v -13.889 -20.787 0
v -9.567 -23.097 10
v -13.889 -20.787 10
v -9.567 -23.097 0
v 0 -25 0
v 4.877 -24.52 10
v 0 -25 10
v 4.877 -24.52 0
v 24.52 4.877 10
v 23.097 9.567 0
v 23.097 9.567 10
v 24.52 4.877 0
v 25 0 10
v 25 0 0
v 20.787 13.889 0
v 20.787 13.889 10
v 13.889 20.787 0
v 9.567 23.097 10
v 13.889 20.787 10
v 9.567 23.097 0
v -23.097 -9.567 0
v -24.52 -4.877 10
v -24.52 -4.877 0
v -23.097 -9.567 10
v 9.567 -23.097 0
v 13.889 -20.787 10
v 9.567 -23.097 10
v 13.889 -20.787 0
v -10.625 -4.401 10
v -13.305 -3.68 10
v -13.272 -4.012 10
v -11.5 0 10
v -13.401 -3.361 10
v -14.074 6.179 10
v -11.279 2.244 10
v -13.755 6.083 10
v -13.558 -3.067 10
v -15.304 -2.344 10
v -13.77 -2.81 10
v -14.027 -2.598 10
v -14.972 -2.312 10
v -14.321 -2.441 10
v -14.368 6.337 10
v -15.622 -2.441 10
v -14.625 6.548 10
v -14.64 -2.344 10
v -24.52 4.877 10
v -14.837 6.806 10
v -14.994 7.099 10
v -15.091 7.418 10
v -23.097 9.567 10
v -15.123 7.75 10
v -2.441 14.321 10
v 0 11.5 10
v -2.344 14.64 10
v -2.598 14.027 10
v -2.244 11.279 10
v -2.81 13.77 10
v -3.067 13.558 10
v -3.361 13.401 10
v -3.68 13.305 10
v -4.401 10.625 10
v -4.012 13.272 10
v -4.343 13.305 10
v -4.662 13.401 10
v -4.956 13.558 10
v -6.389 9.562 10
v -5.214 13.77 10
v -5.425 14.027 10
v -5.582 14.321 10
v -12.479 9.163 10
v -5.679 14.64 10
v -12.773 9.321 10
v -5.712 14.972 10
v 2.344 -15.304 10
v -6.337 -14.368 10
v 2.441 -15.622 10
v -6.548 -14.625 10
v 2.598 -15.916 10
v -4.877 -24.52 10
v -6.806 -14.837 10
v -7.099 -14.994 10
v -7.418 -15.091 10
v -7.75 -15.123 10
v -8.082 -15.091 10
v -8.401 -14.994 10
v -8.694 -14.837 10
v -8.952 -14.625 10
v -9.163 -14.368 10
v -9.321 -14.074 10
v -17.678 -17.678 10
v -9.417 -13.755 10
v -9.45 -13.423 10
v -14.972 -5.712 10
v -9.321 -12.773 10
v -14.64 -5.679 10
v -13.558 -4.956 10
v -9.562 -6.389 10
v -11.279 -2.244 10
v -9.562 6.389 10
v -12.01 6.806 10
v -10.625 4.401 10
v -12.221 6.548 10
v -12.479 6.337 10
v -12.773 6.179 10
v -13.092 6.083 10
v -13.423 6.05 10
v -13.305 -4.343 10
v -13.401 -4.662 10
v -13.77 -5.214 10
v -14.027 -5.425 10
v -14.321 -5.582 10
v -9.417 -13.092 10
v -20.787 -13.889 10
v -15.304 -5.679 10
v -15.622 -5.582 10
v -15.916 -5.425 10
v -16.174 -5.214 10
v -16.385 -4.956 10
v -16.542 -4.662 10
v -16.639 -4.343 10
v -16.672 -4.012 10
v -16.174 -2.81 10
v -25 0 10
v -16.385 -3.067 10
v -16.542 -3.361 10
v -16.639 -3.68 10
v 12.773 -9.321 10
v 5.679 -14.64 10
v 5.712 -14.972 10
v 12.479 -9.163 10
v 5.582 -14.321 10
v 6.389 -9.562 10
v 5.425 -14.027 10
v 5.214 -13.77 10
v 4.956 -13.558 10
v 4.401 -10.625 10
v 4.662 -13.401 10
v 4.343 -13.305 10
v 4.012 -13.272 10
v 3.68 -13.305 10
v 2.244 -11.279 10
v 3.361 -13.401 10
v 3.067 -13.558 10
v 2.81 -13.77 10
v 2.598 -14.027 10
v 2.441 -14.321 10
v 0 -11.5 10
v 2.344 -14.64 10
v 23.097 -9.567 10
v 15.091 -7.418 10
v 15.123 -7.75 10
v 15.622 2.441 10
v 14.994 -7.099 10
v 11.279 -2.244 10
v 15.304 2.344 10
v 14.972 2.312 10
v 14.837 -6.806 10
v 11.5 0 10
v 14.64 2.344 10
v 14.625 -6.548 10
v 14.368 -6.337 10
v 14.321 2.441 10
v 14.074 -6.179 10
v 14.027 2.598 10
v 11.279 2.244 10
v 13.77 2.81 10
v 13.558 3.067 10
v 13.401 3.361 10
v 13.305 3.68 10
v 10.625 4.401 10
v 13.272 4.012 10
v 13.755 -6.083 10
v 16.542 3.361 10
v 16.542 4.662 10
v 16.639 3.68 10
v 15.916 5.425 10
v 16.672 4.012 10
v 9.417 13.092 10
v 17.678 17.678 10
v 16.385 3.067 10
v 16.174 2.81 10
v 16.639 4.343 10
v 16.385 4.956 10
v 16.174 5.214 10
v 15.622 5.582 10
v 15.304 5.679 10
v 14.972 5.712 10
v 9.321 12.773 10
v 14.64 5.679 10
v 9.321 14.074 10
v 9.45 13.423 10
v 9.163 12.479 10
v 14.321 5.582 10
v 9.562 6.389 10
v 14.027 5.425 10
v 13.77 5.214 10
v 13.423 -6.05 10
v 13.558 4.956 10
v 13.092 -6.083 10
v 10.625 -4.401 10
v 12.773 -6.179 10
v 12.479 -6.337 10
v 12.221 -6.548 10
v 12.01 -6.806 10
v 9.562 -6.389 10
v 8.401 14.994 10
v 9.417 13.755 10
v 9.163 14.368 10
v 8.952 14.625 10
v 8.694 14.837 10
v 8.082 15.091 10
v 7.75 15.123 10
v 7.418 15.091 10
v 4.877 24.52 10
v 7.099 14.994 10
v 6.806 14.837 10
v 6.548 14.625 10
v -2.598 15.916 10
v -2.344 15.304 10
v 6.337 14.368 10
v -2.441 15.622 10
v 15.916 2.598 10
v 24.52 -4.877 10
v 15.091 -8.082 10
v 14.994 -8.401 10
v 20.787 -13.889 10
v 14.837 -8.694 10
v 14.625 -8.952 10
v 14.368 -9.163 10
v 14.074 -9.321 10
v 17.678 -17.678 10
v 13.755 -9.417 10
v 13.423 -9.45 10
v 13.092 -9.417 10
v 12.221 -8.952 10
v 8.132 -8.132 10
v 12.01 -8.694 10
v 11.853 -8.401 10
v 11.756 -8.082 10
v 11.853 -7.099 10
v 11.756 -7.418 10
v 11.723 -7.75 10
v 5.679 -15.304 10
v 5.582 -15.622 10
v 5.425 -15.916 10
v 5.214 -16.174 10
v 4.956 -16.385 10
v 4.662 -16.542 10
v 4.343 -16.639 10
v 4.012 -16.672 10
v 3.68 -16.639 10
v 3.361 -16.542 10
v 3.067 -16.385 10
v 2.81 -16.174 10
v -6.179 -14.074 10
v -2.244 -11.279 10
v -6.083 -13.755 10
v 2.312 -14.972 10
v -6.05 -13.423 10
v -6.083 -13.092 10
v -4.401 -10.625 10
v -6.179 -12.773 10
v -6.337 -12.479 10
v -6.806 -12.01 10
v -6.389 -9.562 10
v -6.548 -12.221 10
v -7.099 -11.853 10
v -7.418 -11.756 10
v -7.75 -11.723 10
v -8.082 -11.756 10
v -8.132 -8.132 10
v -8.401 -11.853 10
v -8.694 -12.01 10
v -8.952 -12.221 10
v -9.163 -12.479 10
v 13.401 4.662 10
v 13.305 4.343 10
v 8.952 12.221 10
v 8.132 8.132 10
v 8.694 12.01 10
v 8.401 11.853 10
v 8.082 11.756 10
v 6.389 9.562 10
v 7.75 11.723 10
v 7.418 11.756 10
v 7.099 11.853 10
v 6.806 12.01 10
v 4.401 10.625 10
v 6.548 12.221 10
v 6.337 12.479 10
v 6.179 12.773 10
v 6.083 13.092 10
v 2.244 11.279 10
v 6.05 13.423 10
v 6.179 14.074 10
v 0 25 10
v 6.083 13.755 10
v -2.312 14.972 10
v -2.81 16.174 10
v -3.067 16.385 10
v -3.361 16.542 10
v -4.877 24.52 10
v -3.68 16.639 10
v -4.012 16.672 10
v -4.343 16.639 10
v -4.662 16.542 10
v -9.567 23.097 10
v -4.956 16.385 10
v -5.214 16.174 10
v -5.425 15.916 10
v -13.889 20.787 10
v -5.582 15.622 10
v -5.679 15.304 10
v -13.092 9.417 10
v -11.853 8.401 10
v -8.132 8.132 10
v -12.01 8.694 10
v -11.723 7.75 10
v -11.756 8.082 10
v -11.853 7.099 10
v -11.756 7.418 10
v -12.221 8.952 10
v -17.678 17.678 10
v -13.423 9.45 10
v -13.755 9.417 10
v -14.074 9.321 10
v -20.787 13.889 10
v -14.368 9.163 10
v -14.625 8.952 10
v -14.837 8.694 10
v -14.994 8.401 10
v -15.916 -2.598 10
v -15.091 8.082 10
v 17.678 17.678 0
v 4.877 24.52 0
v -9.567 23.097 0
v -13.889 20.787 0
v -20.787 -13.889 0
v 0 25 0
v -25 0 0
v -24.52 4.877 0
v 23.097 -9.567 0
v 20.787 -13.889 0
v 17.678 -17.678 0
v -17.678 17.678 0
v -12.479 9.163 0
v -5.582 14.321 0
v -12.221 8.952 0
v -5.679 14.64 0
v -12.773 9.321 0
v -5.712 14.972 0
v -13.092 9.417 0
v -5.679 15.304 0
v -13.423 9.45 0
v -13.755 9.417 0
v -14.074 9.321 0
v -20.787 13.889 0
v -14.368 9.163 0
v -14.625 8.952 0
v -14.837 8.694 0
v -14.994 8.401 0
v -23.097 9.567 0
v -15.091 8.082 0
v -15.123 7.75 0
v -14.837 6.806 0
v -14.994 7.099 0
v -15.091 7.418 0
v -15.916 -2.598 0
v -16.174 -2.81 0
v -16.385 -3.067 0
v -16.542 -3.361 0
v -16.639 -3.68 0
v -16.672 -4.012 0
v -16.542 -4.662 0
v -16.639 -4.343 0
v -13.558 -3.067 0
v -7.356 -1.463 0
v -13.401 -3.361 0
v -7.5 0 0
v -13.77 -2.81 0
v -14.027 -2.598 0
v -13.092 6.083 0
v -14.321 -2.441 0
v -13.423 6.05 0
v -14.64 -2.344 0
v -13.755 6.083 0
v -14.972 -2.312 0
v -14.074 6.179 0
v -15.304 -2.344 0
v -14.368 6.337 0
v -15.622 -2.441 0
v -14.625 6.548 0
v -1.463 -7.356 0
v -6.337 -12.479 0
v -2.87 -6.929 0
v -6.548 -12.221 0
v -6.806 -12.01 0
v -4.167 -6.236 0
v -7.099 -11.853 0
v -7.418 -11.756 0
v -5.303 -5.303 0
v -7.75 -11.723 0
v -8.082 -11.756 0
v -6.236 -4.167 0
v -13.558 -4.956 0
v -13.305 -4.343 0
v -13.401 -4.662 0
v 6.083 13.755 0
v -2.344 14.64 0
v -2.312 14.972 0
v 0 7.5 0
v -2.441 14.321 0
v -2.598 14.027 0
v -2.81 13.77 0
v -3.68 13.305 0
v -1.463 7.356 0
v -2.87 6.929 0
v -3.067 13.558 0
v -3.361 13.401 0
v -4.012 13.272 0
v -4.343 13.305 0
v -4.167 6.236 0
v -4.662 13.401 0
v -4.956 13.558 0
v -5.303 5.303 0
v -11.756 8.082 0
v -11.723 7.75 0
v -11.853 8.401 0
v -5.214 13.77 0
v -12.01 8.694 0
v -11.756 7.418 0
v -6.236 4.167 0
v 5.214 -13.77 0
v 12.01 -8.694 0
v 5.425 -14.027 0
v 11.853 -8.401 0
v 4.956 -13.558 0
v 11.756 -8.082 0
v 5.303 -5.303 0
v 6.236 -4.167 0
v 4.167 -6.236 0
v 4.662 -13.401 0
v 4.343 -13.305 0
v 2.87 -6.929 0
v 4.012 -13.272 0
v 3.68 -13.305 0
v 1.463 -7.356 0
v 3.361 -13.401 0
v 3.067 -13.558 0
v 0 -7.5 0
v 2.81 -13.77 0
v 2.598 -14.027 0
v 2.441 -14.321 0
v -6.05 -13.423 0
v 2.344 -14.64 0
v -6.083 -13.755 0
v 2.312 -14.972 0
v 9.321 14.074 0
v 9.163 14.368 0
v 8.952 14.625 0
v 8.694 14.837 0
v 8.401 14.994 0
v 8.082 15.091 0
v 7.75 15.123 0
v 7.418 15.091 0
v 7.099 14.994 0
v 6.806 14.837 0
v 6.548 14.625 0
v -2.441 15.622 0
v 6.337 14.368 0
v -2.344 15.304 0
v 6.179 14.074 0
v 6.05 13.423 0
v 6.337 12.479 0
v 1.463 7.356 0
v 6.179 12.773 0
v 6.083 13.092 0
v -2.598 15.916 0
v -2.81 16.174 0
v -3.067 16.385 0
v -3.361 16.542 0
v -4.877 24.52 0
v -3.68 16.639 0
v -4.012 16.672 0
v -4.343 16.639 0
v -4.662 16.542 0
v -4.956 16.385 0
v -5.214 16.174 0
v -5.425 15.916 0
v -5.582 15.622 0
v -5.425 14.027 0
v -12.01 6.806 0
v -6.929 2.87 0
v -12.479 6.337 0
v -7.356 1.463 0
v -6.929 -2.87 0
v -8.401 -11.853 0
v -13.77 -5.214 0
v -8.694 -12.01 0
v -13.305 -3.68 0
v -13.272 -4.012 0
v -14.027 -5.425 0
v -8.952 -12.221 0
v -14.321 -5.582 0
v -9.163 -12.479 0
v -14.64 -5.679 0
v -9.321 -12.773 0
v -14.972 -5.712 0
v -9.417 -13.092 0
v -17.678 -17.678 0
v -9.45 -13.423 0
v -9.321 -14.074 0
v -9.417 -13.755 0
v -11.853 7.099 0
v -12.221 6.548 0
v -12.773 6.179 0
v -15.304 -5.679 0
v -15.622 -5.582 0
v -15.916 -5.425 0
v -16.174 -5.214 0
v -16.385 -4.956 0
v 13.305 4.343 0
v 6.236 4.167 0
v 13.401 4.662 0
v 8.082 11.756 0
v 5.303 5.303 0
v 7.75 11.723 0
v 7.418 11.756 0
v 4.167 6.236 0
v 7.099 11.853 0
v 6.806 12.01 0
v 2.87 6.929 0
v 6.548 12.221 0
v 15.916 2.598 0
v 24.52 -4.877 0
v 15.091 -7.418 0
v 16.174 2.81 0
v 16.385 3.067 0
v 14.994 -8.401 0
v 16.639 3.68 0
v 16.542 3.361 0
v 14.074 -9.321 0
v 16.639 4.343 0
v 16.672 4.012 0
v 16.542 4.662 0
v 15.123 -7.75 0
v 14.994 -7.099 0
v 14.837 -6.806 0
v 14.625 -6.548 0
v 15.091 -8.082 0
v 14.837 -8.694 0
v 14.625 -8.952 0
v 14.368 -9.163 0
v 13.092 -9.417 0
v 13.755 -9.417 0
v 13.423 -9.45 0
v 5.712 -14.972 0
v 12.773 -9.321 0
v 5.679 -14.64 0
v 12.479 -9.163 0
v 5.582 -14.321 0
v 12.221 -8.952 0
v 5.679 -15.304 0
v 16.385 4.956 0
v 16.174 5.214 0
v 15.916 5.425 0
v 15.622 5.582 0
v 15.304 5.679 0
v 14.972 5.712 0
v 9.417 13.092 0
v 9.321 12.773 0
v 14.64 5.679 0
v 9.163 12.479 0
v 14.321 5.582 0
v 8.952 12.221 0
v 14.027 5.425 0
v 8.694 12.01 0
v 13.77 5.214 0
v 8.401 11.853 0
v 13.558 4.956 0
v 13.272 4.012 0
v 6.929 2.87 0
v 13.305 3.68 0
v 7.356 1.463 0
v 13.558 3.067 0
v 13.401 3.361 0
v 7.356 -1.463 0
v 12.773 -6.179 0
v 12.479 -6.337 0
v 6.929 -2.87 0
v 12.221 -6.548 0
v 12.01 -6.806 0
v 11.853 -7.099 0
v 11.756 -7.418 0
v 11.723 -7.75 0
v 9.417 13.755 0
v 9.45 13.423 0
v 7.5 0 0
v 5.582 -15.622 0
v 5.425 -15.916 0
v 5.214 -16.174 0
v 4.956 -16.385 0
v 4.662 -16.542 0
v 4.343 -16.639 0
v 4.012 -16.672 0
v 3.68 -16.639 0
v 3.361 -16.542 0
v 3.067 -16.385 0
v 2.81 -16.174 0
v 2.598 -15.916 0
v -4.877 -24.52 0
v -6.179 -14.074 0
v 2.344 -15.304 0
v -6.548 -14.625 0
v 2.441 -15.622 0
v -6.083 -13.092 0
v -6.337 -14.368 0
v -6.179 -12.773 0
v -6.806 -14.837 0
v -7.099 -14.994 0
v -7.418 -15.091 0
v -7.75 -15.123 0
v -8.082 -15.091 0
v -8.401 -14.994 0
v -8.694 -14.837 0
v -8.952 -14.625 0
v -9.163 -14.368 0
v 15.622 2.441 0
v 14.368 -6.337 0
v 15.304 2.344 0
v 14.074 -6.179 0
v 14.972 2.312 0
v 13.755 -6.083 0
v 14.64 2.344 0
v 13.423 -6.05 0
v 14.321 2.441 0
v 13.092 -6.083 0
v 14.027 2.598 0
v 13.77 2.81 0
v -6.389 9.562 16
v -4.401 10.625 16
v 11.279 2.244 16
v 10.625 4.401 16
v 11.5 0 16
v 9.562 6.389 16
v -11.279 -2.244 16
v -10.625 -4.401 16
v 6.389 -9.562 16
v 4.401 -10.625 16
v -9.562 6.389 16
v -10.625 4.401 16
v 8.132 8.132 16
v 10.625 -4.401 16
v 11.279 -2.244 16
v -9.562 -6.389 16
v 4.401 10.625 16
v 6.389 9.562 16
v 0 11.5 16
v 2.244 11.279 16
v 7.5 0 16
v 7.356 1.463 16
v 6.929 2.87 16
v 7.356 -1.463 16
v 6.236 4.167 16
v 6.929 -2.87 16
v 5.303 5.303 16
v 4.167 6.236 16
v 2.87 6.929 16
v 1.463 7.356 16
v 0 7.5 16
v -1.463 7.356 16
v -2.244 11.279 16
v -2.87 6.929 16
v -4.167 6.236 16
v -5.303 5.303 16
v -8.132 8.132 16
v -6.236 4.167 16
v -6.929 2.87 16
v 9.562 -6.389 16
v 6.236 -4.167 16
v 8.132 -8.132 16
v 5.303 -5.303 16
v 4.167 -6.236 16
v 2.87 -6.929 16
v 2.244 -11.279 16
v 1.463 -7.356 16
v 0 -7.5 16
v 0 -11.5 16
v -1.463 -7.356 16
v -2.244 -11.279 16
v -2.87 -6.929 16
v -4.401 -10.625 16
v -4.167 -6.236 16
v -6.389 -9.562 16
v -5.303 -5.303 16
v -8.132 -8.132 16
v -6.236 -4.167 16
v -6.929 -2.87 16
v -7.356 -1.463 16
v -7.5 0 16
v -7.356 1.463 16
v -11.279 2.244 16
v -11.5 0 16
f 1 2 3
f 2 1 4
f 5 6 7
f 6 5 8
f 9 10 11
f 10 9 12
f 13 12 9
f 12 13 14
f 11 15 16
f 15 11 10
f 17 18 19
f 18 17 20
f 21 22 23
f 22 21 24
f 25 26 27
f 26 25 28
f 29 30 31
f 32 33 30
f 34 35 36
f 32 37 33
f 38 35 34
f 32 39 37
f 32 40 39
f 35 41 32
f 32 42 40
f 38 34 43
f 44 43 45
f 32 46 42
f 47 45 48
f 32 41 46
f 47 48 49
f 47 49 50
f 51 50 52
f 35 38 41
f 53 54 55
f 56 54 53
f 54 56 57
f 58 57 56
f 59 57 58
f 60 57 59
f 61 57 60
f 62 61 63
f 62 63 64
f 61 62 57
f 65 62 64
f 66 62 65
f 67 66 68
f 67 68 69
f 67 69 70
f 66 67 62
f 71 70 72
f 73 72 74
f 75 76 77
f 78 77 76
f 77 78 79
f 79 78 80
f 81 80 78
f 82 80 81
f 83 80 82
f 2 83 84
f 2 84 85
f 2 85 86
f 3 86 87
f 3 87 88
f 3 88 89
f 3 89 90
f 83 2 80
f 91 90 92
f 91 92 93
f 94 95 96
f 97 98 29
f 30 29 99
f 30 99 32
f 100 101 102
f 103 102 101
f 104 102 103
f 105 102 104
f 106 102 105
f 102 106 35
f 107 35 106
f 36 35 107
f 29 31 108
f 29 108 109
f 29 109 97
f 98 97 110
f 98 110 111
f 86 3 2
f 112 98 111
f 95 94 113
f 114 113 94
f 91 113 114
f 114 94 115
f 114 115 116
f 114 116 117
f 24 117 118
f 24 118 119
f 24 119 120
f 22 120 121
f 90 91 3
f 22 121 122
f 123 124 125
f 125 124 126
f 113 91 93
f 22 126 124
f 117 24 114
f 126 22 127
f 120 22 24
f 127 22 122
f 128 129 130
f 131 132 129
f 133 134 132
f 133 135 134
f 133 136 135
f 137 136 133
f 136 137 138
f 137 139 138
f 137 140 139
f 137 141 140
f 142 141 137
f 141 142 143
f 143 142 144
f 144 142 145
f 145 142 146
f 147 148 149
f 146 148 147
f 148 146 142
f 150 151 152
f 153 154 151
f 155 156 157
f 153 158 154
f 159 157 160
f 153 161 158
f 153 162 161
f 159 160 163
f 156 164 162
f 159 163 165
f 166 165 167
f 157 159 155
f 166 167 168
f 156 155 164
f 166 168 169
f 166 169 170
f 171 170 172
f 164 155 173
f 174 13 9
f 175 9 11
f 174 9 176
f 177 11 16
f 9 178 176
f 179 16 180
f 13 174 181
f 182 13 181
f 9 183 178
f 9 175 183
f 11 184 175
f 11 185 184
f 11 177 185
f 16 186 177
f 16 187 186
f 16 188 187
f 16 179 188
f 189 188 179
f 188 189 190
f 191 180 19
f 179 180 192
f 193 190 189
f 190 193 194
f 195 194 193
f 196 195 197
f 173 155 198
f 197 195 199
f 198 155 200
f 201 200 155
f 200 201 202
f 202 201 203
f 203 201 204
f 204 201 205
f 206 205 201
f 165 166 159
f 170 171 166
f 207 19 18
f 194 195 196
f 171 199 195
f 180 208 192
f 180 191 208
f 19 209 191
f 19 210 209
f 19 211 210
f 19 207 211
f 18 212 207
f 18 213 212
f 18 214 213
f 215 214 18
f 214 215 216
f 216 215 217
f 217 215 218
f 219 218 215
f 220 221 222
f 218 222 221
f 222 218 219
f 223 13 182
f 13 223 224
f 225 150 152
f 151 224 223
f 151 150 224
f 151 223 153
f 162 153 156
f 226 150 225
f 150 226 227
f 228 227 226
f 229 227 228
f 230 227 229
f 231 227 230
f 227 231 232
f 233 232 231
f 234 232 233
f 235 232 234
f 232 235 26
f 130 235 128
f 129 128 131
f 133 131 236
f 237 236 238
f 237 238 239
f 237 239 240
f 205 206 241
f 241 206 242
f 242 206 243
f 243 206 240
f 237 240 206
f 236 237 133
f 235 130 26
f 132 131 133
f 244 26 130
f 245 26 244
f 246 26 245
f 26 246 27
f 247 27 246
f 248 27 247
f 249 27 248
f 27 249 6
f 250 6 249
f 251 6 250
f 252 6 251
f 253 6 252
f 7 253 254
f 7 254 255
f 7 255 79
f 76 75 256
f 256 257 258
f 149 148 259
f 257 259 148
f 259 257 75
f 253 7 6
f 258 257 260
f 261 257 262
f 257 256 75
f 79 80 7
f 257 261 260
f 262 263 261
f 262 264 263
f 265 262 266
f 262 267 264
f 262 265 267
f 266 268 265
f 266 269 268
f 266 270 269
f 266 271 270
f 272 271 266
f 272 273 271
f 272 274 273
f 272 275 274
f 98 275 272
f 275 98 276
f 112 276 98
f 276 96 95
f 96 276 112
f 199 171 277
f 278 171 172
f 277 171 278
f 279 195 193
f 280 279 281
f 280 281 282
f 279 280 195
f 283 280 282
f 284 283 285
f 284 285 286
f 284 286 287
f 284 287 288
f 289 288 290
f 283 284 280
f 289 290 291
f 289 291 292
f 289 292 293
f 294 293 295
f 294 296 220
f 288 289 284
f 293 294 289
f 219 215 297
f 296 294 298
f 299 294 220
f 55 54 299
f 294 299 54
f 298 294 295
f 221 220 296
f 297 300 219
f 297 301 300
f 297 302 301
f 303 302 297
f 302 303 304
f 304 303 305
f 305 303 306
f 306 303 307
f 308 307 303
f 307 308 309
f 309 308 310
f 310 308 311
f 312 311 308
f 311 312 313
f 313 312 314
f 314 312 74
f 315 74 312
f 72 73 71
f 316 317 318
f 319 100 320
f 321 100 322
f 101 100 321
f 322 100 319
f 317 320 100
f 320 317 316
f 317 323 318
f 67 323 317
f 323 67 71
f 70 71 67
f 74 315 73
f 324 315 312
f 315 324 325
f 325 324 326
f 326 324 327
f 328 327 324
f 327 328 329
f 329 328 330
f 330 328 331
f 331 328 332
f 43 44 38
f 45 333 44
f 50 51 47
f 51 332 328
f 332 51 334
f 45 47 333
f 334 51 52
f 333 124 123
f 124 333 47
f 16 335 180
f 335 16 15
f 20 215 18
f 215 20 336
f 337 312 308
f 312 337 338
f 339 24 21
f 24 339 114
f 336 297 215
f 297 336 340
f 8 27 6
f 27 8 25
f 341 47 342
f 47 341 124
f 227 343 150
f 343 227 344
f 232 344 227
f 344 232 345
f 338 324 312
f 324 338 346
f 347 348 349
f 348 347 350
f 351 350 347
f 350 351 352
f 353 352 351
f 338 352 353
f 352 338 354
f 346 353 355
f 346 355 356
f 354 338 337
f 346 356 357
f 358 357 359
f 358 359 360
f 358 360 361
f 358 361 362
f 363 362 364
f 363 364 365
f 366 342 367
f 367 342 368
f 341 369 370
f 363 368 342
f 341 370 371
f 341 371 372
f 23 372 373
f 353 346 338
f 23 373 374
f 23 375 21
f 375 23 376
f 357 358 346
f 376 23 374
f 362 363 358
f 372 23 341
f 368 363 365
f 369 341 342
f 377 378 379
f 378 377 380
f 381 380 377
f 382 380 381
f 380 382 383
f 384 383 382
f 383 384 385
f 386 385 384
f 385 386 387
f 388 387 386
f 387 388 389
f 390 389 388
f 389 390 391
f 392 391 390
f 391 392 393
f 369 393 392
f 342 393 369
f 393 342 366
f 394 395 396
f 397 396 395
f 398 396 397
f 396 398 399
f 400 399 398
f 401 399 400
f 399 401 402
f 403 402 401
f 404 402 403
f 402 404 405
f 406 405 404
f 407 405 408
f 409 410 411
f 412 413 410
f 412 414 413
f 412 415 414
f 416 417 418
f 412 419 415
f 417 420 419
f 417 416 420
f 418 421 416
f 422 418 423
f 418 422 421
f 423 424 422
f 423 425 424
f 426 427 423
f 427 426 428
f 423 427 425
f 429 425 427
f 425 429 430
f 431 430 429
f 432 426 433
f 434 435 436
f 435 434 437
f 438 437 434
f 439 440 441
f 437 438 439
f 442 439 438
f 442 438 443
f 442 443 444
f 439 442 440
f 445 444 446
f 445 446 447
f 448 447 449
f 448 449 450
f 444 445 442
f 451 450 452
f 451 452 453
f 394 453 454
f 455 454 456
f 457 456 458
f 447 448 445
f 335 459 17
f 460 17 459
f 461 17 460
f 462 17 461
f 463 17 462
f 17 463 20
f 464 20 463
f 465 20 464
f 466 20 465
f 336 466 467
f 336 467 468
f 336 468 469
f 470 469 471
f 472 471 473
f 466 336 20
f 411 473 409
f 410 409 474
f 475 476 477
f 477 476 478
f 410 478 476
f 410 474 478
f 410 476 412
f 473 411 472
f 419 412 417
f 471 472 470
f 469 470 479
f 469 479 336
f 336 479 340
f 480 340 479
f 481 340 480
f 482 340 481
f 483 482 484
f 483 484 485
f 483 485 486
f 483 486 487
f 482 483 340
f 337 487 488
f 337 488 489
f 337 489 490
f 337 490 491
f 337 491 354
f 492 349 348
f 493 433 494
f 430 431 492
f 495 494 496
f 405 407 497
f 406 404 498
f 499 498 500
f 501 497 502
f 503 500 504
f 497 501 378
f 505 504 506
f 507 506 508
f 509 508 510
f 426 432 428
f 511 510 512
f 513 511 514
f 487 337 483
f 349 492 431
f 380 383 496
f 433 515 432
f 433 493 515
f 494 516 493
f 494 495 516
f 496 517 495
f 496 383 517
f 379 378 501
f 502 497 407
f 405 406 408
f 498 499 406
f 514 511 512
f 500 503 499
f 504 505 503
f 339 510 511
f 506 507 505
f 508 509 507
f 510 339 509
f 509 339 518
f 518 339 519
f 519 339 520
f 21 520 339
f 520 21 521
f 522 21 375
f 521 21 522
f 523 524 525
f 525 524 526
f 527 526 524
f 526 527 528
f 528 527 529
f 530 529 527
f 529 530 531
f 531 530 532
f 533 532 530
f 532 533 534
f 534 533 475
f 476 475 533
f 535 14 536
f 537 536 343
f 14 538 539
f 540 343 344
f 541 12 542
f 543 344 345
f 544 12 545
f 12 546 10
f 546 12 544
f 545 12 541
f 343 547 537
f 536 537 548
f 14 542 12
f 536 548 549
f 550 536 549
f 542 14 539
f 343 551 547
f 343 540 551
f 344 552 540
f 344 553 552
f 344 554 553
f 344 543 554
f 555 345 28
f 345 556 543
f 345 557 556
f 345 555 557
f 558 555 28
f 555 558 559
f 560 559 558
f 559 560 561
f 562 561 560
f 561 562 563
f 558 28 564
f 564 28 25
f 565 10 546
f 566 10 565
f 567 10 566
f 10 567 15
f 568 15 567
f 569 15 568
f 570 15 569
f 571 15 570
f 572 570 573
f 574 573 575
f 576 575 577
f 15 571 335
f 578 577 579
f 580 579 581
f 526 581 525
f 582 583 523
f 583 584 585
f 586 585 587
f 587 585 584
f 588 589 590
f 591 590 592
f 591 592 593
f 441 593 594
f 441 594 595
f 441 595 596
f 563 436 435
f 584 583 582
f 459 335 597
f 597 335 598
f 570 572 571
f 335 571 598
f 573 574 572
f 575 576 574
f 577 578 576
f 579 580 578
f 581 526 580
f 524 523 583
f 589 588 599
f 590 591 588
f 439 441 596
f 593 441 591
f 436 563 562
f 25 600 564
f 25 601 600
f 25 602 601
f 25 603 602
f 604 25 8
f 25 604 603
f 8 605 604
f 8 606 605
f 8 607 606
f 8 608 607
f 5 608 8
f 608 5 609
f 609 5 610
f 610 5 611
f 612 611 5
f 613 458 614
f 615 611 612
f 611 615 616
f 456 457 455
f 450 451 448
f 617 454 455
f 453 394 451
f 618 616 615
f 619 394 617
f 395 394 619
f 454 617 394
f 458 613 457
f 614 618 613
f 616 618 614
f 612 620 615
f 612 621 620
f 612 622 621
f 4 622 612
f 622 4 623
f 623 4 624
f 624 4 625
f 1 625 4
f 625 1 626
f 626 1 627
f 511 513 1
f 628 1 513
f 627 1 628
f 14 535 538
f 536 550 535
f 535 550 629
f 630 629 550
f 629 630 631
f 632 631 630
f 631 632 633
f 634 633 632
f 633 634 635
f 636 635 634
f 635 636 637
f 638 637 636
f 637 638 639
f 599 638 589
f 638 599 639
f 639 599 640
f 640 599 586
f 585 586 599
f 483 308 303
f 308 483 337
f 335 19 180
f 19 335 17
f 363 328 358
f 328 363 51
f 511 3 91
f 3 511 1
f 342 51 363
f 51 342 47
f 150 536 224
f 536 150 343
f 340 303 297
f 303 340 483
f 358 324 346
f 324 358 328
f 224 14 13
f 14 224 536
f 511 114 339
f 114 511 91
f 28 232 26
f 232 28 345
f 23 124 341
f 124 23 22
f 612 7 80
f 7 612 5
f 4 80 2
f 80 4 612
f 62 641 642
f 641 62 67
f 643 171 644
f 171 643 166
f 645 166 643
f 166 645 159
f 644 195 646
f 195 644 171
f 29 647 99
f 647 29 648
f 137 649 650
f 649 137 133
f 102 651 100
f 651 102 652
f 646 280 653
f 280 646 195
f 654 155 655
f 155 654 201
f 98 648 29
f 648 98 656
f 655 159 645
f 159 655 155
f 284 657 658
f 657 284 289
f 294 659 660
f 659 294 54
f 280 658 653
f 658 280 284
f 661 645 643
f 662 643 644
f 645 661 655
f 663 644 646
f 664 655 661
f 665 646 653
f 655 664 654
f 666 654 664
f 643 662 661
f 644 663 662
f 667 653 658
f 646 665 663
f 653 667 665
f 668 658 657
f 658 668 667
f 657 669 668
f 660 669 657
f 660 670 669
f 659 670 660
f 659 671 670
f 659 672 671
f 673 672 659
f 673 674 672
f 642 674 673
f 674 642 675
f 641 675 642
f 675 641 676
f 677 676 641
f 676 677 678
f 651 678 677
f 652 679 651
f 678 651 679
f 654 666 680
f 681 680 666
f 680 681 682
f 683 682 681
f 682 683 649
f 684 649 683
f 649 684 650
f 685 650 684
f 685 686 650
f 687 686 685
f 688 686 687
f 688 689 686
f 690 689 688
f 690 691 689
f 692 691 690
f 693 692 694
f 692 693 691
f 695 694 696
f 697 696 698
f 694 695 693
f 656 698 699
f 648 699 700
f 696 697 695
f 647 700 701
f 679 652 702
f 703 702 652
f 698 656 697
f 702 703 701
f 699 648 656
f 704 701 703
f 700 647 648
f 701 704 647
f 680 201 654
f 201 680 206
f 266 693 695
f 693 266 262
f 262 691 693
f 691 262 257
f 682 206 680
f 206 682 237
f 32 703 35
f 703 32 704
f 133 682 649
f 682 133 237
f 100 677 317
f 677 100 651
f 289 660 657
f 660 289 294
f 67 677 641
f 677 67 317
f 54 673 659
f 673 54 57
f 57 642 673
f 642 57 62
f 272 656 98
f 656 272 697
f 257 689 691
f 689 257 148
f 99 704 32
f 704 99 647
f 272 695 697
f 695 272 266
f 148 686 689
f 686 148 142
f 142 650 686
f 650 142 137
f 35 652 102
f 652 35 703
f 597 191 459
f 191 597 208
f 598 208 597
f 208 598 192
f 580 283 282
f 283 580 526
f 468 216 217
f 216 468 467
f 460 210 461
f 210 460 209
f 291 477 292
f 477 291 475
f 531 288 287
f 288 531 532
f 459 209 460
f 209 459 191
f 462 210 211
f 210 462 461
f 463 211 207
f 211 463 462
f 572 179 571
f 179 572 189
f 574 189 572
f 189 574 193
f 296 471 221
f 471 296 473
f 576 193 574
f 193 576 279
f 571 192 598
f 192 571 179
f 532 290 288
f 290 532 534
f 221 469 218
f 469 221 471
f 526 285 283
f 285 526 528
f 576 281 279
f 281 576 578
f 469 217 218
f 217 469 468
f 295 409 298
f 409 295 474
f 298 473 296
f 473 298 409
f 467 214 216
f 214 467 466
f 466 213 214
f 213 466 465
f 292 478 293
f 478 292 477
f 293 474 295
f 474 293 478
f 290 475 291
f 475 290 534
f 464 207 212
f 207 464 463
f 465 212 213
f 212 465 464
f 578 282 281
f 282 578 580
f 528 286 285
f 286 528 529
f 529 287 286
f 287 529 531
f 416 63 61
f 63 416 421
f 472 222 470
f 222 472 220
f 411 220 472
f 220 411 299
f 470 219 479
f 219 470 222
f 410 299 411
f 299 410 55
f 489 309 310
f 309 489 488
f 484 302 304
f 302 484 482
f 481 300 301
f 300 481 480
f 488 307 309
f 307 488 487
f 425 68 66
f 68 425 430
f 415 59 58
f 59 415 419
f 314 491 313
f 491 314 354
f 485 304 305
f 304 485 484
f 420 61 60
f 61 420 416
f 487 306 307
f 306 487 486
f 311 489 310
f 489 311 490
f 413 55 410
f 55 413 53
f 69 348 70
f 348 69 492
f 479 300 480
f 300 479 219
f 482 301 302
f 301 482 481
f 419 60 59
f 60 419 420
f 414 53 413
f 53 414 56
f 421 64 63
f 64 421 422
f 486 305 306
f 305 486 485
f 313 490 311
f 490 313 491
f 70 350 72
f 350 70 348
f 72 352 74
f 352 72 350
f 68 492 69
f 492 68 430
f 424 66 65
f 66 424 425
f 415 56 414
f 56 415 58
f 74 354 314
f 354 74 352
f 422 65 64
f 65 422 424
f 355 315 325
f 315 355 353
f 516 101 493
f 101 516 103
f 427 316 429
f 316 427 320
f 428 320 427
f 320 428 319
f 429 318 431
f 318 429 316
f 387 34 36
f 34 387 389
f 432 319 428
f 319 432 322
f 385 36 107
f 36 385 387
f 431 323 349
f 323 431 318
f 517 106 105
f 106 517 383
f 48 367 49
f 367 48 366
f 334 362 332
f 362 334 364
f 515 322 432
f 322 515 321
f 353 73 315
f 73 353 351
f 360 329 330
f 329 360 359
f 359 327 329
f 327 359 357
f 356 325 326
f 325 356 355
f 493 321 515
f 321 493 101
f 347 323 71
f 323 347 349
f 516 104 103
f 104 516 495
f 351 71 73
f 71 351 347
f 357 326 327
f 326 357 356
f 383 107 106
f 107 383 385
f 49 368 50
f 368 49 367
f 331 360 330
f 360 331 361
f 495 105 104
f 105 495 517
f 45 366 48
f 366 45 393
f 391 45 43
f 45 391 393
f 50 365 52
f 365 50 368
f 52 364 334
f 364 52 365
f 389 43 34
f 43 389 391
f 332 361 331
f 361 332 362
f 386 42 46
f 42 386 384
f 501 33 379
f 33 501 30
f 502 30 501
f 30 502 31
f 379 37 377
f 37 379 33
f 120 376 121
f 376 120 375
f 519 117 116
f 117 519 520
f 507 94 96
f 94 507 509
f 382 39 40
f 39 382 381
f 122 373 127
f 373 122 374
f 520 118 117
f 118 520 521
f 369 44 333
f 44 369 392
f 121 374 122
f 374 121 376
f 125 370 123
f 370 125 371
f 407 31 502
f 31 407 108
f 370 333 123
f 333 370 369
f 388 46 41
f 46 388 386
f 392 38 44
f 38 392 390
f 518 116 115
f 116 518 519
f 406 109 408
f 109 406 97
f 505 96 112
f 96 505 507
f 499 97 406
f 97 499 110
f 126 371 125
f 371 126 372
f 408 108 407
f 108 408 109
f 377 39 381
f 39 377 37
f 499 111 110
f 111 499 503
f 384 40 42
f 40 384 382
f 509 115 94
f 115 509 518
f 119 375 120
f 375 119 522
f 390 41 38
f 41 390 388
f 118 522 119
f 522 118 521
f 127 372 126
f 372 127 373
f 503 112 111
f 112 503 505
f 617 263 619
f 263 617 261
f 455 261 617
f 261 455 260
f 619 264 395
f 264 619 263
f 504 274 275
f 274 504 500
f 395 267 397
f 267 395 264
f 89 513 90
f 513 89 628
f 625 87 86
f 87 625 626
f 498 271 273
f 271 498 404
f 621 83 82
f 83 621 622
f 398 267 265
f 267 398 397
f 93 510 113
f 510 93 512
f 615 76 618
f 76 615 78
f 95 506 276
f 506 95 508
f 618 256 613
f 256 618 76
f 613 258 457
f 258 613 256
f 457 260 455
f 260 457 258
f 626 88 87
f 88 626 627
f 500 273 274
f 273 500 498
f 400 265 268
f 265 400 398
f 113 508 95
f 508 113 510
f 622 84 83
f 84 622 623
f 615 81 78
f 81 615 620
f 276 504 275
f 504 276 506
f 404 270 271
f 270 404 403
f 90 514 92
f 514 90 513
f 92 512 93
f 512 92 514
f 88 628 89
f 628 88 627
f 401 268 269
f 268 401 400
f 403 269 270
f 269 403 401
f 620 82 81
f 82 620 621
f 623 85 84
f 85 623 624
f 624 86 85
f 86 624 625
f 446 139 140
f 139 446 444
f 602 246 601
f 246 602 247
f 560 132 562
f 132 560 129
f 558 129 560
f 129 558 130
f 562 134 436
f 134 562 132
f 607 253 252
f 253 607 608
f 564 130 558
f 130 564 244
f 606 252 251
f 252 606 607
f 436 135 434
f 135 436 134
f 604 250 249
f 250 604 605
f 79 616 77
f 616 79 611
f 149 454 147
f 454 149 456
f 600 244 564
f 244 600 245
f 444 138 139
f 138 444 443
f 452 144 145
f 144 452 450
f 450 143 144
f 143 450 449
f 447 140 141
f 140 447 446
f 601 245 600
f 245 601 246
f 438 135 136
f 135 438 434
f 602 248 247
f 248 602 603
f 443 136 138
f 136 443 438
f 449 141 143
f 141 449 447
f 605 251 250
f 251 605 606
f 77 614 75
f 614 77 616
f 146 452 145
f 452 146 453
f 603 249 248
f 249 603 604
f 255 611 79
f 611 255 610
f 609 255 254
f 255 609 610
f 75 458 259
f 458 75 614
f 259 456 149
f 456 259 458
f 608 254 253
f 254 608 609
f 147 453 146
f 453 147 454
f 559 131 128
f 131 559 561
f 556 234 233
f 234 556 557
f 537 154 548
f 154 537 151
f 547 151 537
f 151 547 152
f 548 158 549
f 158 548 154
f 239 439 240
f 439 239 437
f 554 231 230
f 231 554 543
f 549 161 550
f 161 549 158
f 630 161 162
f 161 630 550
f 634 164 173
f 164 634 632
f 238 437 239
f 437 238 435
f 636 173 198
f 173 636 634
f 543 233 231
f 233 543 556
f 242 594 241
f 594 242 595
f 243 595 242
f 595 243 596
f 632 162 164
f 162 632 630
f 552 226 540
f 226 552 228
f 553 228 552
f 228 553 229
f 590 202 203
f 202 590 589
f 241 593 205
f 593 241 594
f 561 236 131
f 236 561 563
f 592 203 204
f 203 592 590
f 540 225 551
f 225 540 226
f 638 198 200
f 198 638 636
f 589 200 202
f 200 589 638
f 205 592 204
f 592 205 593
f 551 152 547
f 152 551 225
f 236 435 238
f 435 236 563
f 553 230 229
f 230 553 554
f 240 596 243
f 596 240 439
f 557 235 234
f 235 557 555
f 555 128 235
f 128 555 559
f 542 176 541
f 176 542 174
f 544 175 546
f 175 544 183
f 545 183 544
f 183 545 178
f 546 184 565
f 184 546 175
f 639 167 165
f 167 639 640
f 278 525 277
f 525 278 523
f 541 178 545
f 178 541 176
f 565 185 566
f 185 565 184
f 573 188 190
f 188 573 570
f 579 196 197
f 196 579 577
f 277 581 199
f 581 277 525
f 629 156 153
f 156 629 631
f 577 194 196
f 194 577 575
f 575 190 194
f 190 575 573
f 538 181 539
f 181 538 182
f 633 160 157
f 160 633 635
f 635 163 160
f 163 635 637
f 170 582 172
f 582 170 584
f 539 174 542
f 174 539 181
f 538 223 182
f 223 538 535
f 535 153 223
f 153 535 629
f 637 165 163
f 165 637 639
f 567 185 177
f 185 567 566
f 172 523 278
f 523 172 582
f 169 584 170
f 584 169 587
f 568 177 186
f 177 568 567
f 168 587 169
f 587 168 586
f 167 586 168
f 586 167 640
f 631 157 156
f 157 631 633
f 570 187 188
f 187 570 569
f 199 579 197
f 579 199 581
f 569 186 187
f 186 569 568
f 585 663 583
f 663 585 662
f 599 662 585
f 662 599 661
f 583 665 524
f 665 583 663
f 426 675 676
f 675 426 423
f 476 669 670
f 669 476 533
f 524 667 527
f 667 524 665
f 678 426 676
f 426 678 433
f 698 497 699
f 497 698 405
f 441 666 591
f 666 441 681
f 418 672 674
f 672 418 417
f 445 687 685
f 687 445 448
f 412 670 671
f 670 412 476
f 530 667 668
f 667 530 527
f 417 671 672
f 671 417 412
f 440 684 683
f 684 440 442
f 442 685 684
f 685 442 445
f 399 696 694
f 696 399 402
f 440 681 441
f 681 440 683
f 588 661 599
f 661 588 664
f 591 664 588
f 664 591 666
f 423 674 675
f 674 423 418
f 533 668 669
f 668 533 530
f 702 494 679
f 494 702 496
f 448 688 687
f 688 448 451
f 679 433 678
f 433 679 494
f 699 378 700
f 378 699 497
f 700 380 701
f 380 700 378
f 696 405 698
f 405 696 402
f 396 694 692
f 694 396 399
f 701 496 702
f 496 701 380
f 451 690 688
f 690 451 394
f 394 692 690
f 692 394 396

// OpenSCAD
$fn = 32;

// ----------------------------------------------------------------------
// Flange Ø50 x 10
// 8 holes on a Ø31 bolt circle, bolted joints
// ----------------------------------------------------------------------

// --- parameters (mm) ---
flange_d = 50;   // outside diameter of the flange
thickness = 10;  // flange thickness
holes = 8;       // number of bolt holes
pcd = 31;        // bolt circle diameter
start_deg = 60;  // angle of the first hole, from +X
hole_d = 3.4;    // bolt hole diameter
bore_d = 15;     // central through bore
hub_d = 23;      // hub outside diameter
hub_h = 6;       // hub height above the flange face (0 = no hub)

// --- derived feature positions (mm) ---
height = thickness + hub_h;  // = 16   overall height of the part
pcd_r = pcd / 2;             // = 15.5   bolt circle radius
hole_step = 360 / holes;     // = 45   angular pitch
feature_centers = [
  [pcd_r * cos(start_deg + 0 * hole_step), pcd_r * sin(start_deg + 0 * hole_step)],
  [pcd_r * cos(start_deg + 1 * hole_step), pcd_r * sin(start_deg + 1 * hole_step)],
  [pcd_r * cos(start_deg + 2 * hole_step), pcd_r * sin(start_deg + 2 * hole_step)],
  [pcd_r * cos(start_deg + 3 * hole_step), pcd_r * sin(start_deg + 3 * hole_step)],
  [pcd_r * cos(start_deg + 4 * hole_step), pcd_r * sin(start_deg + 4 * hole_step)],
  [pcd_r * cos(start_deg + 5 * hole_step), pcd_r * sin(start_deg + 5 * hole_step)],
  [pcd_r * cos(start_deg + 6 * hole_step), pcd_r * sin(start_deg + 6 * hole_step)],
  [pcd_r * cos(start_deg + 7 * hole_step), pcd_r * sin(start_deg + 7 * hole_step)]
];   // bolt hole centres on the pitch circle

// flange disc, every hole and the bore cut straight through
difference() {
  union() {
    cylinder(d = flange_d, h = thickness);
    cylinder(d = hub_d, h = height);  // hub, overlapped into the flange
  }
  translate([0, 0, -1]) cylinder(d = bore_d, h = height + 2);  // bore, through
  for (centre = feature_centers)
    translate([centre[0], centre[1], -1]) cylinder(d = hole_d, h = thickness + 2);
}
